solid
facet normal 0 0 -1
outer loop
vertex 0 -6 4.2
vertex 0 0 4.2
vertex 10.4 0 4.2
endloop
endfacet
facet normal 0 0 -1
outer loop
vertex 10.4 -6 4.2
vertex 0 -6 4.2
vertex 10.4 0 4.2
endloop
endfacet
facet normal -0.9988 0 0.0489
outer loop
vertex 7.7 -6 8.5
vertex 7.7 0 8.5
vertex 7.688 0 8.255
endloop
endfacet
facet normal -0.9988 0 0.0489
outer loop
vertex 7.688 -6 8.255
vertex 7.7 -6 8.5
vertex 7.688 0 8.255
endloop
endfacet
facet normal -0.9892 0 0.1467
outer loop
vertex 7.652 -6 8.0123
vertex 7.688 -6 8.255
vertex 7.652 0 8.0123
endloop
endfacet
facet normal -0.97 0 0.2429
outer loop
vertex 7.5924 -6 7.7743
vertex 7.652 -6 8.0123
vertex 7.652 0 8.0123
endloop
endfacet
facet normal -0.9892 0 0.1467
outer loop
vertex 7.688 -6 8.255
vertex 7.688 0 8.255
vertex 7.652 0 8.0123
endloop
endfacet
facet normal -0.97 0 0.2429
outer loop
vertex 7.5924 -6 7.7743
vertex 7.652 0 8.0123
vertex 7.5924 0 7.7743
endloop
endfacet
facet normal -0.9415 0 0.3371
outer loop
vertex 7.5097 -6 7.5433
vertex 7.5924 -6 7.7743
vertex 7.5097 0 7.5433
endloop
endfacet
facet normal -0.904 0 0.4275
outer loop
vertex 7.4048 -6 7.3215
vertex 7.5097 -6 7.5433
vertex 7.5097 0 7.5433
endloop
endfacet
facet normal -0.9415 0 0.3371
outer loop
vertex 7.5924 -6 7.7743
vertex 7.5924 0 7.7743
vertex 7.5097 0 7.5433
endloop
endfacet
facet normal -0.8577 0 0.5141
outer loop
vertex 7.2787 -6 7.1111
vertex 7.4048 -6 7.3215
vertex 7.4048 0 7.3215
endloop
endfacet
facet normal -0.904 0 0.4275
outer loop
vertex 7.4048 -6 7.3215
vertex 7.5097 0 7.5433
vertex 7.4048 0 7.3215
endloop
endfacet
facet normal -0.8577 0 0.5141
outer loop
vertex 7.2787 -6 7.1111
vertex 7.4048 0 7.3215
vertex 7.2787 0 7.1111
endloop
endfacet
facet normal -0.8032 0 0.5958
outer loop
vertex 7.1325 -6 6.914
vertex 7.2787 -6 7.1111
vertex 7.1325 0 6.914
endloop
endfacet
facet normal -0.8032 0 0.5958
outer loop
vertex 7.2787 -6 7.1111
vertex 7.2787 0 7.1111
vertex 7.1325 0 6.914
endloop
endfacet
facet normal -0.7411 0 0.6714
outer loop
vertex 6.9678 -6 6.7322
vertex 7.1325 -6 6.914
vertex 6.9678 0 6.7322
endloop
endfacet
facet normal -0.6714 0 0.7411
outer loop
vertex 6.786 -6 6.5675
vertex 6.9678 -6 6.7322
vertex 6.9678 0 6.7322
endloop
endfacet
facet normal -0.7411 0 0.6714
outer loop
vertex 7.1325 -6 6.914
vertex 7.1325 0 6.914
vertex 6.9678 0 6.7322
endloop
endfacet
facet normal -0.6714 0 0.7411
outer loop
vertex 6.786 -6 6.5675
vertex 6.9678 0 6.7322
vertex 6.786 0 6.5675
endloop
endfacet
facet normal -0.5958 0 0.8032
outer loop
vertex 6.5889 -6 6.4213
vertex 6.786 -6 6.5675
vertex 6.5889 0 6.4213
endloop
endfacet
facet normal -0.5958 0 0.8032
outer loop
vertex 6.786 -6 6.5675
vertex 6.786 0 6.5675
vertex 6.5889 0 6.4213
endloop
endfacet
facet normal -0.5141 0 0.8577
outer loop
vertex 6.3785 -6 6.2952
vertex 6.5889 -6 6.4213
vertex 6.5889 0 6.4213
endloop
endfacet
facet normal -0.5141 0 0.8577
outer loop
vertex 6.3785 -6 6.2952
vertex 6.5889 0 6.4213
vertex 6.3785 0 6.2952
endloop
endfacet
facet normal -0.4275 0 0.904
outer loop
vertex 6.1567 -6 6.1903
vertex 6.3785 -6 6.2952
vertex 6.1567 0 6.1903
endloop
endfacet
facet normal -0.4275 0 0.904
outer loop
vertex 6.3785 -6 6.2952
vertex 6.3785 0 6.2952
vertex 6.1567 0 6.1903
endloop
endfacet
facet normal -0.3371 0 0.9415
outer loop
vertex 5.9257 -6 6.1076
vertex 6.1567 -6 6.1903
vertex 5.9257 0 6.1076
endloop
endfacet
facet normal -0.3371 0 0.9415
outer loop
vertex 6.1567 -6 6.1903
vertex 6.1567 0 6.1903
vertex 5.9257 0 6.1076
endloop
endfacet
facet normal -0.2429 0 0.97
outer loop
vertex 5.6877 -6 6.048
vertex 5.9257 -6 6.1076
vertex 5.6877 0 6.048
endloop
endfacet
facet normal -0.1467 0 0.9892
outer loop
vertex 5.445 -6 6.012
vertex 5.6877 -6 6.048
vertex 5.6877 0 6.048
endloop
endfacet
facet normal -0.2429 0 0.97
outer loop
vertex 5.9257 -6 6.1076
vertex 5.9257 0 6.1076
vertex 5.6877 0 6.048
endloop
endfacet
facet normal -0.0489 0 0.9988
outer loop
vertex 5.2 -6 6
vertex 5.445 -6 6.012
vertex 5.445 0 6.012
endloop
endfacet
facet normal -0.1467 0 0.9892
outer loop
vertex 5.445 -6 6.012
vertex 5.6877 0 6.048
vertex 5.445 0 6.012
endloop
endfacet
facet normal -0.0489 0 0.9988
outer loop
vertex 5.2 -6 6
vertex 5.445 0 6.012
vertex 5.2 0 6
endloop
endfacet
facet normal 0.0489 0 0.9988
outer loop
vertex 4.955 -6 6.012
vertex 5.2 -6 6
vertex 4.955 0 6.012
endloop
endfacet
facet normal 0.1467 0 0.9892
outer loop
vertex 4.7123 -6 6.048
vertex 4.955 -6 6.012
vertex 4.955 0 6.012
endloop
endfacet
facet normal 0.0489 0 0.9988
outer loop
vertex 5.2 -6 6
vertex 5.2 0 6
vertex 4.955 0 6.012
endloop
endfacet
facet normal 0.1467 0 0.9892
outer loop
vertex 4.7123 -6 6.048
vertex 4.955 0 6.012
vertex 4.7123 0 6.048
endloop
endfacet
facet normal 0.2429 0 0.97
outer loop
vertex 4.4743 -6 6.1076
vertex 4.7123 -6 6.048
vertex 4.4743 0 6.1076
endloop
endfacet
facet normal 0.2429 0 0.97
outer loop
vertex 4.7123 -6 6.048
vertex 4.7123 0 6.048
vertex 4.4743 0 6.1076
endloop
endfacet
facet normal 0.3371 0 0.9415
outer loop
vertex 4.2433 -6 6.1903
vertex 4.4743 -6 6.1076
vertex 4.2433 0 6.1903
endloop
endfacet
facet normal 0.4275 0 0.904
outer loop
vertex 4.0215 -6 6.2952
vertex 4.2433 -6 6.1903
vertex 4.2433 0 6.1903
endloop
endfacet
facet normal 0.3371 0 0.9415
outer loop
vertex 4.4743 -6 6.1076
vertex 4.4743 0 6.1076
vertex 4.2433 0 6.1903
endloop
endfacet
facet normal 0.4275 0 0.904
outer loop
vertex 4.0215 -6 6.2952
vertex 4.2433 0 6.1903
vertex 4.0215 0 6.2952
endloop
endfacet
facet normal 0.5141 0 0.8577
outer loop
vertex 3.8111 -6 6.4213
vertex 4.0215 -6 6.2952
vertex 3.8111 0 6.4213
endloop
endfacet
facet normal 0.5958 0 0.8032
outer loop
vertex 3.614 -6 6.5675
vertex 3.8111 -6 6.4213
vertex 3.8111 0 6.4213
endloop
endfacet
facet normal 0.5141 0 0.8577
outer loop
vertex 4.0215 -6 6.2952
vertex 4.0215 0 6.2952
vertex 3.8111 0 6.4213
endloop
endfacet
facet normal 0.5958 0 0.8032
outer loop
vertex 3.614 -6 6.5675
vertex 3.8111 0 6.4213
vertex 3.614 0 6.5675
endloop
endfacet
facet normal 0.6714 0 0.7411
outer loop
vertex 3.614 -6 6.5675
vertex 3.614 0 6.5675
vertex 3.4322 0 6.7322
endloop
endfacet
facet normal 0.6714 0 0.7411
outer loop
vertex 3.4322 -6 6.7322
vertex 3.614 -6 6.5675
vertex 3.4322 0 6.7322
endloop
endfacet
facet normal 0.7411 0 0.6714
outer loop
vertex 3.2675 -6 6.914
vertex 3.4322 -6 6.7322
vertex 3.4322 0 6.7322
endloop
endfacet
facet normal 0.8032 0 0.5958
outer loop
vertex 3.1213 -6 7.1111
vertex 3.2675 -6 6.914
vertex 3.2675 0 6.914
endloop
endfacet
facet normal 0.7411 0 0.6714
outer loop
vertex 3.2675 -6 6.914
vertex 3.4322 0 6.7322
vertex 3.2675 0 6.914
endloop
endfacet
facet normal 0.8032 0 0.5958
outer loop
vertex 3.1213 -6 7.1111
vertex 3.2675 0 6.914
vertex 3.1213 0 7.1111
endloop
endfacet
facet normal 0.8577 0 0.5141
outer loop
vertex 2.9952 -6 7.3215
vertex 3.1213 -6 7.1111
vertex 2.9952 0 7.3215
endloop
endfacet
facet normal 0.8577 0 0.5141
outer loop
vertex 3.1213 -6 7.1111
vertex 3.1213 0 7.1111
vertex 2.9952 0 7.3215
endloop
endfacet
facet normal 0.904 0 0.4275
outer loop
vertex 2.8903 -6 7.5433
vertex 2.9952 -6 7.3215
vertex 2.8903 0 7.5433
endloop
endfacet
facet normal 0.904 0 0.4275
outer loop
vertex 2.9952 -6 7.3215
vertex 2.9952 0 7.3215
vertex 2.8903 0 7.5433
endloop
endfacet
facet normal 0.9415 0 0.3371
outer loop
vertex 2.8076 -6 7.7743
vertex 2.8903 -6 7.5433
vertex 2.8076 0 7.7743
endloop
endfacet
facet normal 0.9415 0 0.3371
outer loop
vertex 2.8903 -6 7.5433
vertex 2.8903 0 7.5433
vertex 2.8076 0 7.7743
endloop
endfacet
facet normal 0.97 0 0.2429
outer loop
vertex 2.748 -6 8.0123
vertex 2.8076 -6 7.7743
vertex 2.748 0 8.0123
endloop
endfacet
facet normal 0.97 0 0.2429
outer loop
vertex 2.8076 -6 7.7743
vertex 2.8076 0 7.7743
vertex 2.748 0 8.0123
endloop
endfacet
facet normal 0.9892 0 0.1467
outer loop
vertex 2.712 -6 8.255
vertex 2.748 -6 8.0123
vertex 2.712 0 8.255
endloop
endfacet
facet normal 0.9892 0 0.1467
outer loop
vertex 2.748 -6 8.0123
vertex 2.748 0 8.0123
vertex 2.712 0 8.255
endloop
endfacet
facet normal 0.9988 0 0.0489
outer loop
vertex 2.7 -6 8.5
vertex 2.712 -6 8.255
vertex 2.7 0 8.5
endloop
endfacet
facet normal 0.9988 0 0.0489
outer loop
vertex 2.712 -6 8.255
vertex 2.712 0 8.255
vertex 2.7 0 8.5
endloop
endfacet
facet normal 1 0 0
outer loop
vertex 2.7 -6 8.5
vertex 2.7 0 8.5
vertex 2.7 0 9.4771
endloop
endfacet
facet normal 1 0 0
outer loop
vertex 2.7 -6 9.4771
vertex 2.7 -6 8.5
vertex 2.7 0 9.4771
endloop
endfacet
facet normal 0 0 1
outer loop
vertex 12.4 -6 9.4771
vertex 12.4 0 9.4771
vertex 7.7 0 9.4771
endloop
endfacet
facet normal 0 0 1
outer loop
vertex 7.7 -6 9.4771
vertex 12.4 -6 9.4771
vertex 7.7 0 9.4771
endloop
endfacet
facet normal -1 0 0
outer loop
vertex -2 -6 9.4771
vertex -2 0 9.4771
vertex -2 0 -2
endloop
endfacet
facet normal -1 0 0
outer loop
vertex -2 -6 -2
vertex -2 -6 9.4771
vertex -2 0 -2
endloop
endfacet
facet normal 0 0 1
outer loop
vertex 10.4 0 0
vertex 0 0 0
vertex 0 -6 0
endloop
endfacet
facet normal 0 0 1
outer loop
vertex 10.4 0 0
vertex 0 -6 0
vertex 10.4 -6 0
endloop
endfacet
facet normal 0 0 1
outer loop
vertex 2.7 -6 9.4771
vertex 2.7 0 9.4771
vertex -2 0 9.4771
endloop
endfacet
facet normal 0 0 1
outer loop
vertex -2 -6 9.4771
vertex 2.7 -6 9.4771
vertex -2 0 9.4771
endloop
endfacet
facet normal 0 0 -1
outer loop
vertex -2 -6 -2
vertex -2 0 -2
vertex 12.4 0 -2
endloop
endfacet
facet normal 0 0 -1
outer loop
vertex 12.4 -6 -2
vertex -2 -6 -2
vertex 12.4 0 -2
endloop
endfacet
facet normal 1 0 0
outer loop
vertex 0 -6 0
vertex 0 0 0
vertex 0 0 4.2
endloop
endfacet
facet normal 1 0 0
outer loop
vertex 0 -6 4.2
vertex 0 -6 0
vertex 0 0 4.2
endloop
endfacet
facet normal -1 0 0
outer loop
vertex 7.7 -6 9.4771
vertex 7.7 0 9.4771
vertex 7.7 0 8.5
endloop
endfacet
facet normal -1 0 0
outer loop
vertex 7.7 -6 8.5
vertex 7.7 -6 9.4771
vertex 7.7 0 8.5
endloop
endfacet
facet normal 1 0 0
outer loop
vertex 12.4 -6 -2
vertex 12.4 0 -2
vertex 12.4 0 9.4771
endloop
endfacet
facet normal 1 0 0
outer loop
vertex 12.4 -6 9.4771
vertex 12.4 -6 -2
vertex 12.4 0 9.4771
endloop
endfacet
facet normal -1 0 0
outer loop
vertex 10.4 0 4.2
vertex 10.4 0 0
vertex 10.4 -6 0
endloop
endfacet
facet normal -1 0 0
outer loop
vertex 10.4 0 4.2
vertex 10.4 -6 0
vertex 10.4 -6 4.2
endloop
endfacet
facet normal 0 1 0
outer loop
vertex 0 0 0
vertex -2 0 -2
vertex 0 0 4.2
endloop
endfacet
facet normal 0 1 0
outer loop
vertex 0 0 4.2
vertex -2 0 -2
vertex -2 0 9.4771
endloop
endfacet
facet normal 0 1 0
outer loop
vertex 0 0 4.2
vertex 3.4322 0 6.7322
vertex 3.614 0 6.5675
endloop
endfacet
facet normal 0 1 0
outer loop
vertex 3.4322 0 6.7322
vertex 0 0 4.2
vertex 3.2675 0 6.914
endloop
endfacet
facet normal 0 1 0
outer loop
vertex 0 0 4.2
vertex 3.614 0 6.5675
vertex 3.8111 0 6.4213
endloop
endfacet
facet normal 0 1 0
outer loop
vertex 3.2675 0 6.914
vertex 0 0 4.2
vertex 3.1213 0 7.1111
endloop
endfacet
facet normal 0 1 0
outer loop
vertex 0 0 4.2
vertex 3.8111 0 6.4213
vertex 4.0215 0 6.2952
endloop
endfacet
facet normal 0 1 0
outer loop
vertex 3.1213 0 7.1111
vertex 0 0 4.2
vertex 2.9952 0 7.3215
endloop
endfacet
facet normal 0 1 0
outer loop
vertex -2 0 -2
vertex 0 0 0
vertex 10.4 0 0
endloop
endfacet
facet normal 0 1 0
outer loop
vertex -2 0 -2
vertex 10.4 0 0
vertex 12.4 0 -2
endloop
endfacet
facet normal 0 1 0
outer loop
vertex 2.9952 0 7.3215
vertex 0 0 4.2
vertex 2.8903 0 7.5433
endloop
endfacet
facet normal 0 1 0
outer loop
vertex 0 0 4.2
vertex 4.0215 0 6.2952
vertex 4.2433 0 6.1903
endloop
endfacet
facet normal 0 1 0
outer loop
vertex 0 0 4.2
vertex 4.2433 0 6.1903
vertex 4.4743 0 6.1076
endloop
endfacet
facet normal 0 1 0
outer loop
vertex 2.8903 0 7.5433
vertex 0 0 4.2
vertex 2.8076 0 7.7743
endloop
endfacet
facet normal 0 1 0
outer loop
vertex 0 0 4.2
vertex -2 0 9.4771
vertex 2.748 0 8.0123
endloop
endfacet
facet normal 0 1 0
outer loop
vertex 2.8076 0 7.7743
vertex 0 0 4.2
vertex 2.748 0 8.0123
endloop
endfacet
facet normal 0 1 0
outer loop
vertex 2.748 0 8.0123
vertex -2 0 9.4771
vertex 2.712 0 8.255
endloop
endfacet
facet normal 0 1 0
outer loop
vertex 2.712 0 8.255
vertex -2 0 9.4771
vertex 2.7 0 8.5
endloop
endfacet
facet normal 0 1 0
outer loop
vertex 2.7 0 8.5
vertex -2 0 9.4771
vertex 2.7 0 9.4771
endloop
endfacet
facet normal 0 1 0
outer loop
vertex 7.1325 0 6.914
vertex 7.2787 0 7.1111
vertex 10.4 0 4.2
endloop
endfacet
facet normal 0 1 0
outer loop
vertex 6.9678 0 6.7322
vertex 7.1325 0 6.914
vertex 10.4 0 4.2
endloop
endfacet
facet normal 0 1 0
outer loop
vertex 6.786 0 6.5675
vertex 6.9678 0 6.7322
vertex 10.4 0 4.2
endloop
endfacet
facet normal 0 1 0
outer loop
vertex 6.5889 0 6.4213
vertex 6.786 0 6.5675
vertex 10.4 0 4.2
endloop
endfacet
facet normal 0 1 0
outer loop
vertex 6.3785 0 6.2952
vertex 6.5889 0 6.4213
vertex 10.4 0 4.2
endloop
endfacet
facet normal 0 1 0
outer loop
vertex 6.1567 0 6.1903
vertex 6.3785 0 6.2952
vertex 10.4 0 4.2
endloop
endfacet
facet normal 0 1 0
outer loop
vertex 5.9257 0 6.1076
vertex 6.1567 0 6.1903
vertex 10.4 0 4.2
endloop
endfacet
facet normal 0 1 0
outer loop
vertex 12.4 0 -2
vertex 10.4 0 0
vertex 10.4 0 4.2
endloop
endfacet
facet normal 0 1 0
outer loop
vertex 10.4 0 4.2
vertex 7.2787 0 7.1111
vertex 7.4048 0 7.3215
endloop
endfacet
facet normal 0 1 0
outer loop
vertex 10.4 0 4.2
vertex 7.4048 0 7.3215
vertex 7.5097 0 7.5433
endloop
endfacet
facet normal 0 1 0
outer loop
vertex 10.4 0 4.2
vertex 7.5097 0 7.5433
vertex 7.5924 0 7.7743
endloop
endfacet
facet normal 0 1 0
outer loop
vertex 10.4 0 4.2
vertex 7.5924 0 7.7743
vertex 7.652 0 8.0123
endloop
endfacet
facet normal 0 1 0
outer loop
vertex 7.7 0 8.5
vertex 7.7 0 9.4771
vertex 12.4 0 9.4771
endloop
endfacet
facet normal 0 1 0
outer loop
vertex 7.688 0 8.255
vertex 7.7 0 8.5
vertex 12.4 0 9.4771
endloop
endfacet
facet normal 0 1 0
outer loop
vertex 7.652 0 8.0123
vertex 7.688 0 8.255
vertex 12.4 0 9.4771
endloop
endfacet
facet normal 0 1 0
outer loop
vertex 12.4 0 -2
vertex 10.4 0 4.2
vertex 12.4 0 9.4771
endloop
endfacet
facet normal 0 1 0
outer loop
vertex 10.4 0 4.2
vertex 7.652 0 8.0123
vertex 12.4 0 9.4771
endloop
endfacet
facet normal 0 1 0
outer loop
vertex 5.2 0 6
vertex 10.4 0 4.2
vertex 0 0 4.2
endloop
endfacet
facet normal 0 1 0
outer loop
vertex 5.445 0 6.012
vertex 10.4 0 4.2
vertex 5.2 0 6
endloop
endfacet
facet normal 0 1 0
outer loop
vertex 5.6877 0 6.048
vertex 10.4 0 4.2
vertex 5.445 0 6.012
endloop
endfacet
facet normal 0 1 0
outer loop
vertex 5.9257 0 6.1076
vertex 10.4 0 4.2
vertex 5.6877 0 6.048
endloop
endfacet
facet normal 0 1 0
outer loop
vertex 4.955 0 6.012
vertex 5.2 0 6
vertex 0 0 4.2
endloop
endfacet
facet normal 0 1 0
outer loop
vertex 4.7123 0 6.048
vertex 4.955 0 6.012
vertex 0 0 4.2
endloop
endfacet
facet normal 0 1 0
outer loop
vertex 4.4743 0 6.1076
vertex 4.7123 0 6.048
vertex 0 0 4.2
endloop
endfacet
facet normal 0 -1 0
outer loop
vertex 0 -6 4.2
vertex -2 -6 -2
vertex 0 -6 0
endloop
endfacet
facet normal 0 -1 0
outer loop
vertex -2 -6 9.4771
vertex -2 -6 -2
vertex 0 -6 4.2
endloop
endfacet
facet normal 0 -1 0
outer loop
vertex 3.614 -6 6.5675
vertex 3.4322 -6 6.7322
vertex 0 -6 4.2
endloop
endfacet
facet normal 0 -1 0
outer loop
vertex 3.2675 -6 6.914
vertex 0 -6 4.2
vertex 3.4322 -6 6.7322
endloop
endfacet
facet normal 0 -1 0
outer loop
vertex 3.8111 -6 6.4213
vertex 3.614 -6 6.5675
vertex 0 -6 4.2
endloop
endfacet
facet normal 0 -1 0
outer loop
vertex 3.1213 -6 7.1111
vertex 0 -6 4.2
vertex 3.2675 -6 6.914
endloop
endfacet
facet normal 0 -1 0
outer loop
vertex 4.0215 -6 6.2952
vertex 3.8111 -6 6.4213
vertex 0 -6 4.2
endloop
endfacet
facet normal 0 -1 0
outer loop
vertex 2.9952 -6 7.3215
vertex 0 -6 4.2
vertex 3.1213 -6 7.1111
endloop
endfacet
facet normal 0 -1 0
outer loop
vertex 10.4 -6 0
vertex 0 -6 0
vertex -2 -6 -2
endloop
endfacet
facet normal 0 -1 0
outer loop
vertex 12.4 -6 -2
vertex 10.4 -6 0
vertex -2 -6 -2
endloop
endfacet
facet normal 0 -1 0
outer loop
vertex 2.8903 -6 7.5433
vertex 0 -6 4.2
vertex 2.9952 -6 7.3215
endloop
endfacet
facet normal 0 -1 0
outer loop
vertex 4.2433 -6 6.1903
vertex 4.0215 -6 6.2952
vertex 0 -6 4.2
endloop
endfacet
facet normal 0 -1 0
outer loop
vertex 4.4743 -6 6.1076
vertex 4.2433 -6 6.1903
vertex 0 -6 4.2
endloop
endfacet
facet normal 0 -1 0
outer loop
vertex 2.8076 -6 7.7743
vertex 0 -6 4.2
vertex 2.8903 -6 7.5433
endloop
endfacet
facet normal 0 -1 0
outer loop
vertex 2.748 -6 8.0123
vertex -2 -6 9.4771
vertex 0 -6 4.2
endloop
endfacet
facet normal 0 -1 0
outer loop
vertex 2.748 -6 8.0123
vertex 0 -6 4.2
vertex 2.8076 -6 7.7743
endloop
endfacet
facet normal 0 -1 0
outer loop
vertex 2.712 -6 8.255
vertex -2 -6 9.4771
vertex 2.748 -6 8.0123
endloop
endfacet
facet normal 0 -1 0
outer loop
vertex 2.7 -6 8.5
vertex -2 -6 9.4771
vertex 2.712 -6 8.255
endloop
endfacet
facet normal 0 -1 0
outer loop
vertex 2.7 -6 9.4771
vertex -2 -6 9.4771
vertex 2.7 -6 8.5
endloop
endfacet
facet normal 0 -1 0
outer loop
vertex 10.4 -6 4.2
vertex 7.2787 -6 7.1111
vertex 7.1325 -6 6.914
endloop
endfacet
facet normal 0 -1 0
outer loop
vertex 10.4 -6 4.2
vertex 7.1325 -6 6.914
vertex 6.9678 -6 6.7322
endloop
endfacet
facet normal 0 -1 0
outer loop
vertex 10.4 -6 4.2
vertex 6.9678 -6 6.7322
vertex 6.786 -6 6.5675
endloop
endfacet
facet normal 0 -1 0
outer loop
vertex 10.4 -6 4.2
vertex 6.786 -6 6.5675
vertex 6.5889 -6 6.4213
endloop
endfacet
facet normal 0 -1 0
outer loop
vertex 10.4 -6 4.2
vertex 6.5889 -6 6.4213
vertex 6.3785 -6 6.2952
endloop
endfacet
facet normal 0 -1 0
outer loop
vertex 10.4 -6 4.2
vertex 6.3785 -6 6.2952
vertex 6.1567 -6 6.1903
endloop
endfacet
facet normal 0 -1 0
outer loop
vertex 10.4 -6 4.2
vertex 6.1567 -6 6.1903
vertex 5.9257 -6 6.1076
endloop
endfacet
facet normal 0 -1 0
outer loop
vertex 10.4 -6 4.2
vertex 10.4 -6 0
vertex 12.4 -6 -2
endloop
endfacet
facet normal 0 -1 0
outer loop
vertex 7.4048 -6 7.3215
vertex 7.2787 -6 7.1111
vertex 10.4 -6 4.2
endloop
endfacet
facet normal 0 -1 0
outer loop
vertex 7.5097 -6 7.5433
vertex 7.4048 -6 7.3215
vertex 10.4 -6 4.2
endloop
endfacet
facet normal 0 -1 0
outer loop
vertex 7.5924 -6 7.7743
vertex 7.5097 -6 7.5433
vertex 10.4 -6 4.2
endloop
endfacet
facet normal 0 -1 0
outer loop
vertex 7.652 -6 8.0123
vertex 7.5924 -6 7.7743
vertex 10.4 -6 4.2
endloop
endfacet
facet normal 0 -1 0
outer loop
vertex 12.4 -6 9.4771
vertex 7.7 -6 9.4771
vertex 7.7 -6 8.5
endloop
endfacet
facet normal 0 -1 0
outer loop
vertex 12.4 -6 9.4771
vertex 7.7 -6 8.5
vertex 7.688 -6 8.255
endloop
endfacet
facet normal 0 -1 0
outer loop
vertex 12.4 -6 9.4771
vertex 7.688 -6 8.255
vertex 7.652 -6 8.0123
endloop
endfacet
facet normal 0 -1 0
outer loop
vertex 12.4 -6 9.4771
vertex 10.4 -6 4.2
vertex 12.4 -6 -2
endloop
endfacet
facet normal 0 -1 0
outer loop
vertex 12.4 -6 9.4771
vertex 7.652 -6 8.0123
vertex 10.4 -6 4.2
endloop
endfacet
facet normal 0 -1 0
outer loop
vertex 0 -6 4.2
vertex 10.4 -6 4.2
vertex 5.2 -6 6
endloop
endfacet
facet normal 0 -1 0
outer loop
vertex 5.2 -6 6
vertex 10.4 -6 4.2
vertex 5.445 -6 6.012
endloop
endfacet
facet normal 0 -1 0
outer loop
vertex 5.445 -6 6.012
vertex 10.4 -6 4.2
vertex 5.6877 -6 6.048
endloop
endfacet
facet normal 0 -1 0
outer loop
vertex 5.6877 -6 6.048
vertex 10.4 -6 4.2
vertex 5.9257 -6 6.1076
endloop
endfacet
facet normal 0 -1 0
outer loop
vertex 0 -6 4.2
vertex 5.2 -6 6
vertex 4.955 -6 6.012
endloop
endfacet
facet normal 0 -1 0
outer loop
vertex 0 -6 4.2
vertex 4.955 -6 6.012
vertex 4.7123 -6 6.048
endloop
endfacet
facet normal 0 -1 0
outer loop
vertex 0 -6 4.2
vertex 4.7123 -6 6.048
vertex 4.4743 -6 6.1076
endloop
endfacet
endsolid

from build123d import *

# Parameters (mm, degrees)
F0_W     = 10.4
F0_H     = 4.2
F1_DEPTH = 6


with BuildPart() as f1:
    # F0 (on Front) → F1 (new body)
    with BuildSketch(Plane.XZ):
        with BuildLine():
            Line((-2, 6), (-2, -2))
            Line((-2, -2), (12.4, -2))
            Line((12.4, -2), (12.4, 6))
            Line((12.4, 6), (12.4, 8.5))
            Line((12.4, 8.5), (12.4, 9.47713))
            Line((12.4, 9.47713), (7.7, 9.47713))
            Line((7.7, 9.47713), (7.7, 8.5))
            ThreePointArc((7.7, 8.5), (5.2, 6), (2.7, 8.5))
            Line((2.7, 8.5), (2.7, 9.47713))
            Line((2.7, 9.47713), (-2, 9.47713))
            Line((-2, 9.47713), (-2, 8.5))
            Line((-2, 8.5), (-2, 6))
        make_face()
        with Locations((5.2, 2.1)):
            Rectangle(F0_W, F0_H, mode=Mode.SUBTRACT)
    extrude(amount=F1_DEPTH)


solid = f1.part
